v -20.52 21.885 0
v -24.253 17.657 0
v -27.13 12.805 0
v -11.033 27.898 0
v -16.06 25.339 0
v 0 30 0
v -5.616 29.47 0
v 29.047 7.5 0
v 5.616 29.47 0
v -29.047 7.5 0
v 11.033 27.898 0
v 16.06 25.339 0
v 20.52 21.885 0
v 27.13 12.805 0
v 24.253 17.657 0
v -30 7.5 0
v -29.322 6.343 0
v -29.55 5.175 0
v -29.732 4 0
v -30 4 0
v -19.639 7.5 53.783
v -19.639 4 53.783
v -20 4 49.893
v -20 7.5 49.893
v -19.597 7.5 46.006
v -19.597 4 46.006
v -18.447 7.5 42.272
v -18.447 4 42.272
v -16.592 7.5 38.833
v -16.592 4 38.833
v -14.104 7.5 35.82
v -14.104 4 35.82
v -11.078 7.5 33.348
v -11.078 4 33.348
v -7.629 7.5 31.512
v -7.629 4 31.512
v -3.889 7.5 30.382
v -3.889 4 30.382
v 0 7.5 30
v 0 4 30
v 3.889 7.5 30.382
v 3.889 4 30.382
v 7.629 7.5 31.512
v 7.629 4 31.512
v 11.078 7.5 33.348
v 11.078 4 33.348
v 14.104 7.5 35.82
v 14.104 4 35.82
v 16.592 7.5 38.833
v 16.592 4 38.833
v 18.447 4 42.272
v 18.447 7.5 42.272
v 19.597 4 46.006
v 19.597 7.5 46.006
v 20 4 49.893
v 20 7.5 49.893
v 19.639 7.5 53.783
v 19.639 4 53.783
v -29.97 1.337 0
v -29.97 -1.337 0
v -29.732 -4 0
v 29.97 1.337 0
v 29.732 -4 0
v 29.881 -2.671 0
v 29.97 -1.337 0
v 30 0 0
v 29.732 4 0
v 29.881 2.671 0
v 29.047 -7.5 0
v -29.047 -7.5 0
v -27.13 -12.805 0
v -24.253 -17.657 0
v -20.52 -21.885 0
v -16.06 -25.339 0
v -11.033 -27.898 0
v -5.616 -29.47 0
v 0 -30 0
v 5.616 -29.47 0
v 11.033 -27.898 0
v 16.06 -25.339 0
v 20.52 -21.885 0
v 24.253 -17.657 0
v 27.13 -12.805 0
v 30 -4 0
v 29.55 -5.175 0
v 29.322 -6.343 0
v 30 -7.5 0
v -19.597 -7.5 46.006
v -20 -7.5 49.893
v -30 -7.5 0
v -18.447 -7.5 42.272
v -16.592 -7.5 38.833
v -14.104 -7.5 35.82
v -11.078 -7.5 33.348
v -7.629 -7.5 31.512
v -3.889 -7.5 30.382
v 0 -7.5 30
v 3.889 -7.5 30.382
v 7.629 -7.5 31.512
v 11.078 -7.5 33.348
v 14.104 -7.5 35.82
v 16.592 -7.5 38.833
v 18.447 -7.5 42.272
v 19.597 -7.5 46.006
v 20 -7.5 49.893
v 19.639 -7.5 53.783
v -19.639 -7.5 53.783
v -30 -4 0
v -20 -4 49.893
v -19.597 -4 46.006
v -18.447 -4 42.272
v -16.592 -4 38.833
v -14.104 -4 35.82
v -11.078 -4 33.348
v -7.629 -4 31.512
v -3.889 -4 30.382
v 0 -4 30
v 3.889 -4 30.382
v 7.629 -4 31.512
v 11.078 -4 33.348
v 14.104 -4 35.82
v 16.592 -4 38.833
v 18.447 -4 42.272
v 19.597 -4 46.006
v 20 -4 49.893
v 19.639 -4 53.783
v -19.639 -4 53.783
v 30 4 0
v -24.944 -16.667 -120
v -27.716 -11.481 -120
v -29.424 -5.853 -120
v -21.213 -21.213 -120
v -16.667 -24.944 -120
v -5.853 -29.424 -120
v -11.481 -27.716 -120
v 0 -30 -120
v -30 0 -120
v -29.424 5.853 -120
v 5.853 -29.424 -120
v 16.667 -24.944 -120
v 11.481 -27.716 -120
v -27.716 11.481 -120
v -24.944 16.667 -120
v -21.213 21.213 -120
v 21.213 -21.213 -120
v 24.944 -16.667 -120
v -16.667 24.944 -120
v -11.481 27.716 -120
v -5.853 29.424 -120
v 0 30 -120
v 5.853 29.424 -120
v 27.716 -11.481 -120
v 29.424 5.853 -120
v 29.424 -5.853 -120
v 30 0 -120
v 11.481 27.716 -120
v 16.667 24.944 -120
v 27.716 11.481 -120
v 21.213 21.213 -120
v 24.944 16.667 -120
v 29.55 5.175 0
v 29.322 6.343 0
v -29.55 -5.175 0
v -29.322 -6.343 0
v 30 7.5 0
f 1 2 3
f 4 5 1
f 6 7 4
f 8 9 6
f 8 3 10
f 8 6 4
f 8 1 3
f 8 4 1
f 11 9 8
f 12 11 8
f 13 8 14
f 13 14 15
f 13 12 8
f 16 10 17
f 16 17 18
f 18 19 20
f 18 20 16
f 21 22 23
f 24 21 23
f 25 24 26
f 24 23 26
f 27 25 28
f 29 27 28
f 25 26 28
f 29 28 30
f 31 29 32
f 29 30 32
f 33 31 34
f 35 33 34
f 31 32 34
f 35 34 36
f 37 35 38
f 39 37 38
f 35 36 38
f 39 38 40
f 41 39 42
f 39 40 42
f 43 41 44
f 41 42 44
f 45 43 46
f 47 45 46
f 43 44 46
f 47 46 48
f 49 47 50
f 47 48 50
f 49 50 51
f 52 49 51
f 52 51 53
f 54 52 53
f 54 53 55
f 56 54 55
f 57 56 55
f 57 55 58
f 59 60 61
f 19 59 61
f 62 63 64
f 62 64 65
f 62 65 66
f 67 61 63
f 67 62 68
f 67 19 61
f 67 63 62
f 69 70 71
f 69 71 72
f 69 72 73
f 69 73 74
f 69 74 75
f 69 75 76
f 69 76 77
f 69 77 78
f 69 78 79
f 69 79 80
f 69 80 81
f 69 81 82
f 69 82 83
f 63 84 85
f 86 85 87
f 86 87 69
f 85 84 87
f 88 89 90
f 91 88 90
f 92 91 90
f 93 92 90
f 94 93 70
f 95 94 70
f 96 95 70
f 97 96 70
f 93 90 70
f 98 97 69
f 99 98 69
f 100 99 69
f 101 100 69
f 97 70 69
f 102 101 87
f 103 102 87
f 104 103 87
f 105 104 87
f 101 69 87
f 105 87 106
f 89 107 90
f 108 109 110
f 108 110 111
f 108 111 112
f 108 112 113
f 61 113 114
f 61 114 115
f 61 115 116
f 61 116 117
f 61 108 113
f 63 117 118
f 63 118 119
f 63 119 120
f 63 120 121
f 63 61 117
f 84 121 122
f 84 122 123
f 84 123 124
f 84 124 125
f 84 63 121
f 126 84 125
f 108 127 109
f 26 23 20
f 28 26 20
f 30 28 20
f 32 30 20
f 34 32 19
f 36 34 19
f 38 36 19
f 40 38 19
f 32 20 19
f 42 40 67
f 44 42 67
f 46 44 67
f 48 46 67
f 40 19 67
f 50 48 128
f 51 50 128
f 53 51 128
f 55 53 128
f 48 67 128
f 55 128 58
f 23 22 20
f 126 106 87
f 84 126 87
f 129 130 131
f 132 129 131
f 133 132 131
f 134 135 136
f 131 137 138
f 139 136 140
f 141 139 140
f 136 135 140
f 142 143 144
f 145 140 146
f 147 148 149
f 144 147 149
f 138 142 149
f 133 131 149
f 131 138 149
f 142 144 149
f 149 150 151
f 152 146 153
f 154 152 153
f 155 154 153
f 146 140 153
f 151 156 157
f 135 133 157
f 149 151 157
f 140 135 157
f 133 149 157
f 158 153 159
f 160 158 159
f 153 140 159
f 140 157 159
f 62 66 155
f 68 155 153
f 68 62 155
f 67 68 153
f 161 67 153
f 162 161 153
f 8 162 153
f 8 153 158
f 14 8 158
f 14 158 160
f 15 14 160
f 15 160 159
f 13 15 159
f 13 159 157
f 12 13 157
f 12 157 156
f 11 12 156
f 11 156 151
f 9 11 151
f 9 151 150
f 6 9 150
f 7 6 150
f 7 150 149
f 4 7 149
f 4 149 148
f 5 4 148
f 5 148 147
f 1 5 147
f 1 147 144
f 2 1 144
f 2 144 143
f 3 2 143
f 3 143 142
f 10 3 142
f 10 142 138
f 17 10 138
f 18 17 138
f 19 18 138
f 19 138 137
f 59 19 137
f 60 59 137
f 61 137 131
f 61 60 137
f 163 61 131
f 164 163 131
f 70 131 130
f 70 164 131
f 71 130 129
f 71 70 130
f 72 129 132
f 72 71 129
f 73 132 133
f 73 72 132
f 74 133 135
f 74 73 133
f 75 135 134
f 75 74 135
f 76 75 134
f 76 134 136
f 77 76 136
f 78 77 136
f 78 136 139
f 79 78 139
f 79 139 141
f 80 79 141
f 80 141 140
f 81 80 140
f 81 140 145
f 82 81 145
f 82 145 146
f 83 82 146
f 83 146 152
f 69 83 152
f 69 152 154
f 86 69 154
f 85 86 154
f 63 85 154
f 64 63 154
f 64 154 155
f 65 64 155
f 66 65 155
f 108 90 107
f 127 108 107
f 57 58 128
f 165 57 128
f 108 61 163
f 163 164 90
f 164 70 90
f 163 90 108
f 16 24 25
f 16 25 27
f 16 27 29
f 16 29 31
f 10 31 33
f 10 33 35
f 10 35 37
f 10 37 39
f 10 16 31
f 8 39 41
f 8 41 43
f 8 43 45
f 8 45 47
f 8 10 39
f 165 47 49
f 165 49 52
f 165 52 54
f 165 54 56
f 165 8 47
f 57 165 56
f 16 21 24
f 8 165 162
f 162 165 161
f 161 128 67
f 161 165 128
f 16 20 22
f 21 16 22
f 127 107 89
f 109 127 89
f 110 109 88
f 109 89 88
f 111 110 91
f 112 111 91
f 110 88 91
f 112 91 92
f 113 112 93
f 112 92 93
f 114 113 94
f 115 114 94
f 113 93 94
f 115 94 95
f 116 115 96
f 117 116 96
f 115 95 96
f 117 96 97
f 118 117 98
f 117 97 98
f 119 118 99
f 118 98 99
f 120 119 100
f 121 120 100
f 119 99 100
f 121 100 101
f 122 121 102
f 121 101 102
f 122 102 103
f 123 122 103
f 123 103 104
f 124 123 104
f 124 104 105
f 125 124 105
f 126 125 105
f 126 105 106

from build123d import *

# Parameters (mm, degrees)
POLE_SKETCH_R                   = 30
POLE_EXTRUDE_DEPTH              = 120
UPPER_START                     = 4
UPPER_PALM_HOLDER_EXTRUDE_DEPTH = 3.5
LOWER_START                     = -7.5
LOWER_PALM_HOLDER_EXTRUDE_DEPTH = 3.5


with BuildPart() as part:
    # Pole Sketch → Pole Extrude (new body)
    with BuildSketch(Plane.XY):
        Circle(POLE_SKETCH_R)
    extrude(amount=-POLE_EXTRUDE_DEPTH)

    # Palm Holder Sketch → Upper Palm Holder Extrude (add)
    with BuildSketch(Plane(origin=(0, 0, 0), x_dir=(1, 0, 0), z_dir=(0, 1, 0)).offset(UPPER_START)):
        with BuildLine():
            Line((19.63889875, -53.78333925), (30, 0))
            Line((30, 0), (-30, 0))
            Line((-30, 0), (-19.63889875, -53.78333925))
            ThreePointArc((-19.63889875, -53.78333925), (0, -30), (19.63889875, -53.78333925))
        make_face()
    extrude(amount=UPPER_PALM_HOLDER_EXTRUDE_DEPTH)

    # Palm Holder Sketch<2> → Lower Palm Holder Extrude (add)
    with BuildSketch(Plane(origin=(0, 0, 0), x_dir=(1, 0, 0), z_dir=(0, 1, 0)).offset(LOWER_START)):
        with BuildLine():
            Line((19.63889875, -53.78333925), (30, 0))
            Line((30, 0), (-30, 0))
            Line((-30, 0), (-19.63889875, -53.78333925))
            ThreePointArc((-19.63889875, -53.78333925), (0, -30), (19.63889875, -53.78333925))
        make_face()
    extrude(amount=LOWER_PALM_HOLDER_EXTRUDE_DEPTH)


solid = part.part
